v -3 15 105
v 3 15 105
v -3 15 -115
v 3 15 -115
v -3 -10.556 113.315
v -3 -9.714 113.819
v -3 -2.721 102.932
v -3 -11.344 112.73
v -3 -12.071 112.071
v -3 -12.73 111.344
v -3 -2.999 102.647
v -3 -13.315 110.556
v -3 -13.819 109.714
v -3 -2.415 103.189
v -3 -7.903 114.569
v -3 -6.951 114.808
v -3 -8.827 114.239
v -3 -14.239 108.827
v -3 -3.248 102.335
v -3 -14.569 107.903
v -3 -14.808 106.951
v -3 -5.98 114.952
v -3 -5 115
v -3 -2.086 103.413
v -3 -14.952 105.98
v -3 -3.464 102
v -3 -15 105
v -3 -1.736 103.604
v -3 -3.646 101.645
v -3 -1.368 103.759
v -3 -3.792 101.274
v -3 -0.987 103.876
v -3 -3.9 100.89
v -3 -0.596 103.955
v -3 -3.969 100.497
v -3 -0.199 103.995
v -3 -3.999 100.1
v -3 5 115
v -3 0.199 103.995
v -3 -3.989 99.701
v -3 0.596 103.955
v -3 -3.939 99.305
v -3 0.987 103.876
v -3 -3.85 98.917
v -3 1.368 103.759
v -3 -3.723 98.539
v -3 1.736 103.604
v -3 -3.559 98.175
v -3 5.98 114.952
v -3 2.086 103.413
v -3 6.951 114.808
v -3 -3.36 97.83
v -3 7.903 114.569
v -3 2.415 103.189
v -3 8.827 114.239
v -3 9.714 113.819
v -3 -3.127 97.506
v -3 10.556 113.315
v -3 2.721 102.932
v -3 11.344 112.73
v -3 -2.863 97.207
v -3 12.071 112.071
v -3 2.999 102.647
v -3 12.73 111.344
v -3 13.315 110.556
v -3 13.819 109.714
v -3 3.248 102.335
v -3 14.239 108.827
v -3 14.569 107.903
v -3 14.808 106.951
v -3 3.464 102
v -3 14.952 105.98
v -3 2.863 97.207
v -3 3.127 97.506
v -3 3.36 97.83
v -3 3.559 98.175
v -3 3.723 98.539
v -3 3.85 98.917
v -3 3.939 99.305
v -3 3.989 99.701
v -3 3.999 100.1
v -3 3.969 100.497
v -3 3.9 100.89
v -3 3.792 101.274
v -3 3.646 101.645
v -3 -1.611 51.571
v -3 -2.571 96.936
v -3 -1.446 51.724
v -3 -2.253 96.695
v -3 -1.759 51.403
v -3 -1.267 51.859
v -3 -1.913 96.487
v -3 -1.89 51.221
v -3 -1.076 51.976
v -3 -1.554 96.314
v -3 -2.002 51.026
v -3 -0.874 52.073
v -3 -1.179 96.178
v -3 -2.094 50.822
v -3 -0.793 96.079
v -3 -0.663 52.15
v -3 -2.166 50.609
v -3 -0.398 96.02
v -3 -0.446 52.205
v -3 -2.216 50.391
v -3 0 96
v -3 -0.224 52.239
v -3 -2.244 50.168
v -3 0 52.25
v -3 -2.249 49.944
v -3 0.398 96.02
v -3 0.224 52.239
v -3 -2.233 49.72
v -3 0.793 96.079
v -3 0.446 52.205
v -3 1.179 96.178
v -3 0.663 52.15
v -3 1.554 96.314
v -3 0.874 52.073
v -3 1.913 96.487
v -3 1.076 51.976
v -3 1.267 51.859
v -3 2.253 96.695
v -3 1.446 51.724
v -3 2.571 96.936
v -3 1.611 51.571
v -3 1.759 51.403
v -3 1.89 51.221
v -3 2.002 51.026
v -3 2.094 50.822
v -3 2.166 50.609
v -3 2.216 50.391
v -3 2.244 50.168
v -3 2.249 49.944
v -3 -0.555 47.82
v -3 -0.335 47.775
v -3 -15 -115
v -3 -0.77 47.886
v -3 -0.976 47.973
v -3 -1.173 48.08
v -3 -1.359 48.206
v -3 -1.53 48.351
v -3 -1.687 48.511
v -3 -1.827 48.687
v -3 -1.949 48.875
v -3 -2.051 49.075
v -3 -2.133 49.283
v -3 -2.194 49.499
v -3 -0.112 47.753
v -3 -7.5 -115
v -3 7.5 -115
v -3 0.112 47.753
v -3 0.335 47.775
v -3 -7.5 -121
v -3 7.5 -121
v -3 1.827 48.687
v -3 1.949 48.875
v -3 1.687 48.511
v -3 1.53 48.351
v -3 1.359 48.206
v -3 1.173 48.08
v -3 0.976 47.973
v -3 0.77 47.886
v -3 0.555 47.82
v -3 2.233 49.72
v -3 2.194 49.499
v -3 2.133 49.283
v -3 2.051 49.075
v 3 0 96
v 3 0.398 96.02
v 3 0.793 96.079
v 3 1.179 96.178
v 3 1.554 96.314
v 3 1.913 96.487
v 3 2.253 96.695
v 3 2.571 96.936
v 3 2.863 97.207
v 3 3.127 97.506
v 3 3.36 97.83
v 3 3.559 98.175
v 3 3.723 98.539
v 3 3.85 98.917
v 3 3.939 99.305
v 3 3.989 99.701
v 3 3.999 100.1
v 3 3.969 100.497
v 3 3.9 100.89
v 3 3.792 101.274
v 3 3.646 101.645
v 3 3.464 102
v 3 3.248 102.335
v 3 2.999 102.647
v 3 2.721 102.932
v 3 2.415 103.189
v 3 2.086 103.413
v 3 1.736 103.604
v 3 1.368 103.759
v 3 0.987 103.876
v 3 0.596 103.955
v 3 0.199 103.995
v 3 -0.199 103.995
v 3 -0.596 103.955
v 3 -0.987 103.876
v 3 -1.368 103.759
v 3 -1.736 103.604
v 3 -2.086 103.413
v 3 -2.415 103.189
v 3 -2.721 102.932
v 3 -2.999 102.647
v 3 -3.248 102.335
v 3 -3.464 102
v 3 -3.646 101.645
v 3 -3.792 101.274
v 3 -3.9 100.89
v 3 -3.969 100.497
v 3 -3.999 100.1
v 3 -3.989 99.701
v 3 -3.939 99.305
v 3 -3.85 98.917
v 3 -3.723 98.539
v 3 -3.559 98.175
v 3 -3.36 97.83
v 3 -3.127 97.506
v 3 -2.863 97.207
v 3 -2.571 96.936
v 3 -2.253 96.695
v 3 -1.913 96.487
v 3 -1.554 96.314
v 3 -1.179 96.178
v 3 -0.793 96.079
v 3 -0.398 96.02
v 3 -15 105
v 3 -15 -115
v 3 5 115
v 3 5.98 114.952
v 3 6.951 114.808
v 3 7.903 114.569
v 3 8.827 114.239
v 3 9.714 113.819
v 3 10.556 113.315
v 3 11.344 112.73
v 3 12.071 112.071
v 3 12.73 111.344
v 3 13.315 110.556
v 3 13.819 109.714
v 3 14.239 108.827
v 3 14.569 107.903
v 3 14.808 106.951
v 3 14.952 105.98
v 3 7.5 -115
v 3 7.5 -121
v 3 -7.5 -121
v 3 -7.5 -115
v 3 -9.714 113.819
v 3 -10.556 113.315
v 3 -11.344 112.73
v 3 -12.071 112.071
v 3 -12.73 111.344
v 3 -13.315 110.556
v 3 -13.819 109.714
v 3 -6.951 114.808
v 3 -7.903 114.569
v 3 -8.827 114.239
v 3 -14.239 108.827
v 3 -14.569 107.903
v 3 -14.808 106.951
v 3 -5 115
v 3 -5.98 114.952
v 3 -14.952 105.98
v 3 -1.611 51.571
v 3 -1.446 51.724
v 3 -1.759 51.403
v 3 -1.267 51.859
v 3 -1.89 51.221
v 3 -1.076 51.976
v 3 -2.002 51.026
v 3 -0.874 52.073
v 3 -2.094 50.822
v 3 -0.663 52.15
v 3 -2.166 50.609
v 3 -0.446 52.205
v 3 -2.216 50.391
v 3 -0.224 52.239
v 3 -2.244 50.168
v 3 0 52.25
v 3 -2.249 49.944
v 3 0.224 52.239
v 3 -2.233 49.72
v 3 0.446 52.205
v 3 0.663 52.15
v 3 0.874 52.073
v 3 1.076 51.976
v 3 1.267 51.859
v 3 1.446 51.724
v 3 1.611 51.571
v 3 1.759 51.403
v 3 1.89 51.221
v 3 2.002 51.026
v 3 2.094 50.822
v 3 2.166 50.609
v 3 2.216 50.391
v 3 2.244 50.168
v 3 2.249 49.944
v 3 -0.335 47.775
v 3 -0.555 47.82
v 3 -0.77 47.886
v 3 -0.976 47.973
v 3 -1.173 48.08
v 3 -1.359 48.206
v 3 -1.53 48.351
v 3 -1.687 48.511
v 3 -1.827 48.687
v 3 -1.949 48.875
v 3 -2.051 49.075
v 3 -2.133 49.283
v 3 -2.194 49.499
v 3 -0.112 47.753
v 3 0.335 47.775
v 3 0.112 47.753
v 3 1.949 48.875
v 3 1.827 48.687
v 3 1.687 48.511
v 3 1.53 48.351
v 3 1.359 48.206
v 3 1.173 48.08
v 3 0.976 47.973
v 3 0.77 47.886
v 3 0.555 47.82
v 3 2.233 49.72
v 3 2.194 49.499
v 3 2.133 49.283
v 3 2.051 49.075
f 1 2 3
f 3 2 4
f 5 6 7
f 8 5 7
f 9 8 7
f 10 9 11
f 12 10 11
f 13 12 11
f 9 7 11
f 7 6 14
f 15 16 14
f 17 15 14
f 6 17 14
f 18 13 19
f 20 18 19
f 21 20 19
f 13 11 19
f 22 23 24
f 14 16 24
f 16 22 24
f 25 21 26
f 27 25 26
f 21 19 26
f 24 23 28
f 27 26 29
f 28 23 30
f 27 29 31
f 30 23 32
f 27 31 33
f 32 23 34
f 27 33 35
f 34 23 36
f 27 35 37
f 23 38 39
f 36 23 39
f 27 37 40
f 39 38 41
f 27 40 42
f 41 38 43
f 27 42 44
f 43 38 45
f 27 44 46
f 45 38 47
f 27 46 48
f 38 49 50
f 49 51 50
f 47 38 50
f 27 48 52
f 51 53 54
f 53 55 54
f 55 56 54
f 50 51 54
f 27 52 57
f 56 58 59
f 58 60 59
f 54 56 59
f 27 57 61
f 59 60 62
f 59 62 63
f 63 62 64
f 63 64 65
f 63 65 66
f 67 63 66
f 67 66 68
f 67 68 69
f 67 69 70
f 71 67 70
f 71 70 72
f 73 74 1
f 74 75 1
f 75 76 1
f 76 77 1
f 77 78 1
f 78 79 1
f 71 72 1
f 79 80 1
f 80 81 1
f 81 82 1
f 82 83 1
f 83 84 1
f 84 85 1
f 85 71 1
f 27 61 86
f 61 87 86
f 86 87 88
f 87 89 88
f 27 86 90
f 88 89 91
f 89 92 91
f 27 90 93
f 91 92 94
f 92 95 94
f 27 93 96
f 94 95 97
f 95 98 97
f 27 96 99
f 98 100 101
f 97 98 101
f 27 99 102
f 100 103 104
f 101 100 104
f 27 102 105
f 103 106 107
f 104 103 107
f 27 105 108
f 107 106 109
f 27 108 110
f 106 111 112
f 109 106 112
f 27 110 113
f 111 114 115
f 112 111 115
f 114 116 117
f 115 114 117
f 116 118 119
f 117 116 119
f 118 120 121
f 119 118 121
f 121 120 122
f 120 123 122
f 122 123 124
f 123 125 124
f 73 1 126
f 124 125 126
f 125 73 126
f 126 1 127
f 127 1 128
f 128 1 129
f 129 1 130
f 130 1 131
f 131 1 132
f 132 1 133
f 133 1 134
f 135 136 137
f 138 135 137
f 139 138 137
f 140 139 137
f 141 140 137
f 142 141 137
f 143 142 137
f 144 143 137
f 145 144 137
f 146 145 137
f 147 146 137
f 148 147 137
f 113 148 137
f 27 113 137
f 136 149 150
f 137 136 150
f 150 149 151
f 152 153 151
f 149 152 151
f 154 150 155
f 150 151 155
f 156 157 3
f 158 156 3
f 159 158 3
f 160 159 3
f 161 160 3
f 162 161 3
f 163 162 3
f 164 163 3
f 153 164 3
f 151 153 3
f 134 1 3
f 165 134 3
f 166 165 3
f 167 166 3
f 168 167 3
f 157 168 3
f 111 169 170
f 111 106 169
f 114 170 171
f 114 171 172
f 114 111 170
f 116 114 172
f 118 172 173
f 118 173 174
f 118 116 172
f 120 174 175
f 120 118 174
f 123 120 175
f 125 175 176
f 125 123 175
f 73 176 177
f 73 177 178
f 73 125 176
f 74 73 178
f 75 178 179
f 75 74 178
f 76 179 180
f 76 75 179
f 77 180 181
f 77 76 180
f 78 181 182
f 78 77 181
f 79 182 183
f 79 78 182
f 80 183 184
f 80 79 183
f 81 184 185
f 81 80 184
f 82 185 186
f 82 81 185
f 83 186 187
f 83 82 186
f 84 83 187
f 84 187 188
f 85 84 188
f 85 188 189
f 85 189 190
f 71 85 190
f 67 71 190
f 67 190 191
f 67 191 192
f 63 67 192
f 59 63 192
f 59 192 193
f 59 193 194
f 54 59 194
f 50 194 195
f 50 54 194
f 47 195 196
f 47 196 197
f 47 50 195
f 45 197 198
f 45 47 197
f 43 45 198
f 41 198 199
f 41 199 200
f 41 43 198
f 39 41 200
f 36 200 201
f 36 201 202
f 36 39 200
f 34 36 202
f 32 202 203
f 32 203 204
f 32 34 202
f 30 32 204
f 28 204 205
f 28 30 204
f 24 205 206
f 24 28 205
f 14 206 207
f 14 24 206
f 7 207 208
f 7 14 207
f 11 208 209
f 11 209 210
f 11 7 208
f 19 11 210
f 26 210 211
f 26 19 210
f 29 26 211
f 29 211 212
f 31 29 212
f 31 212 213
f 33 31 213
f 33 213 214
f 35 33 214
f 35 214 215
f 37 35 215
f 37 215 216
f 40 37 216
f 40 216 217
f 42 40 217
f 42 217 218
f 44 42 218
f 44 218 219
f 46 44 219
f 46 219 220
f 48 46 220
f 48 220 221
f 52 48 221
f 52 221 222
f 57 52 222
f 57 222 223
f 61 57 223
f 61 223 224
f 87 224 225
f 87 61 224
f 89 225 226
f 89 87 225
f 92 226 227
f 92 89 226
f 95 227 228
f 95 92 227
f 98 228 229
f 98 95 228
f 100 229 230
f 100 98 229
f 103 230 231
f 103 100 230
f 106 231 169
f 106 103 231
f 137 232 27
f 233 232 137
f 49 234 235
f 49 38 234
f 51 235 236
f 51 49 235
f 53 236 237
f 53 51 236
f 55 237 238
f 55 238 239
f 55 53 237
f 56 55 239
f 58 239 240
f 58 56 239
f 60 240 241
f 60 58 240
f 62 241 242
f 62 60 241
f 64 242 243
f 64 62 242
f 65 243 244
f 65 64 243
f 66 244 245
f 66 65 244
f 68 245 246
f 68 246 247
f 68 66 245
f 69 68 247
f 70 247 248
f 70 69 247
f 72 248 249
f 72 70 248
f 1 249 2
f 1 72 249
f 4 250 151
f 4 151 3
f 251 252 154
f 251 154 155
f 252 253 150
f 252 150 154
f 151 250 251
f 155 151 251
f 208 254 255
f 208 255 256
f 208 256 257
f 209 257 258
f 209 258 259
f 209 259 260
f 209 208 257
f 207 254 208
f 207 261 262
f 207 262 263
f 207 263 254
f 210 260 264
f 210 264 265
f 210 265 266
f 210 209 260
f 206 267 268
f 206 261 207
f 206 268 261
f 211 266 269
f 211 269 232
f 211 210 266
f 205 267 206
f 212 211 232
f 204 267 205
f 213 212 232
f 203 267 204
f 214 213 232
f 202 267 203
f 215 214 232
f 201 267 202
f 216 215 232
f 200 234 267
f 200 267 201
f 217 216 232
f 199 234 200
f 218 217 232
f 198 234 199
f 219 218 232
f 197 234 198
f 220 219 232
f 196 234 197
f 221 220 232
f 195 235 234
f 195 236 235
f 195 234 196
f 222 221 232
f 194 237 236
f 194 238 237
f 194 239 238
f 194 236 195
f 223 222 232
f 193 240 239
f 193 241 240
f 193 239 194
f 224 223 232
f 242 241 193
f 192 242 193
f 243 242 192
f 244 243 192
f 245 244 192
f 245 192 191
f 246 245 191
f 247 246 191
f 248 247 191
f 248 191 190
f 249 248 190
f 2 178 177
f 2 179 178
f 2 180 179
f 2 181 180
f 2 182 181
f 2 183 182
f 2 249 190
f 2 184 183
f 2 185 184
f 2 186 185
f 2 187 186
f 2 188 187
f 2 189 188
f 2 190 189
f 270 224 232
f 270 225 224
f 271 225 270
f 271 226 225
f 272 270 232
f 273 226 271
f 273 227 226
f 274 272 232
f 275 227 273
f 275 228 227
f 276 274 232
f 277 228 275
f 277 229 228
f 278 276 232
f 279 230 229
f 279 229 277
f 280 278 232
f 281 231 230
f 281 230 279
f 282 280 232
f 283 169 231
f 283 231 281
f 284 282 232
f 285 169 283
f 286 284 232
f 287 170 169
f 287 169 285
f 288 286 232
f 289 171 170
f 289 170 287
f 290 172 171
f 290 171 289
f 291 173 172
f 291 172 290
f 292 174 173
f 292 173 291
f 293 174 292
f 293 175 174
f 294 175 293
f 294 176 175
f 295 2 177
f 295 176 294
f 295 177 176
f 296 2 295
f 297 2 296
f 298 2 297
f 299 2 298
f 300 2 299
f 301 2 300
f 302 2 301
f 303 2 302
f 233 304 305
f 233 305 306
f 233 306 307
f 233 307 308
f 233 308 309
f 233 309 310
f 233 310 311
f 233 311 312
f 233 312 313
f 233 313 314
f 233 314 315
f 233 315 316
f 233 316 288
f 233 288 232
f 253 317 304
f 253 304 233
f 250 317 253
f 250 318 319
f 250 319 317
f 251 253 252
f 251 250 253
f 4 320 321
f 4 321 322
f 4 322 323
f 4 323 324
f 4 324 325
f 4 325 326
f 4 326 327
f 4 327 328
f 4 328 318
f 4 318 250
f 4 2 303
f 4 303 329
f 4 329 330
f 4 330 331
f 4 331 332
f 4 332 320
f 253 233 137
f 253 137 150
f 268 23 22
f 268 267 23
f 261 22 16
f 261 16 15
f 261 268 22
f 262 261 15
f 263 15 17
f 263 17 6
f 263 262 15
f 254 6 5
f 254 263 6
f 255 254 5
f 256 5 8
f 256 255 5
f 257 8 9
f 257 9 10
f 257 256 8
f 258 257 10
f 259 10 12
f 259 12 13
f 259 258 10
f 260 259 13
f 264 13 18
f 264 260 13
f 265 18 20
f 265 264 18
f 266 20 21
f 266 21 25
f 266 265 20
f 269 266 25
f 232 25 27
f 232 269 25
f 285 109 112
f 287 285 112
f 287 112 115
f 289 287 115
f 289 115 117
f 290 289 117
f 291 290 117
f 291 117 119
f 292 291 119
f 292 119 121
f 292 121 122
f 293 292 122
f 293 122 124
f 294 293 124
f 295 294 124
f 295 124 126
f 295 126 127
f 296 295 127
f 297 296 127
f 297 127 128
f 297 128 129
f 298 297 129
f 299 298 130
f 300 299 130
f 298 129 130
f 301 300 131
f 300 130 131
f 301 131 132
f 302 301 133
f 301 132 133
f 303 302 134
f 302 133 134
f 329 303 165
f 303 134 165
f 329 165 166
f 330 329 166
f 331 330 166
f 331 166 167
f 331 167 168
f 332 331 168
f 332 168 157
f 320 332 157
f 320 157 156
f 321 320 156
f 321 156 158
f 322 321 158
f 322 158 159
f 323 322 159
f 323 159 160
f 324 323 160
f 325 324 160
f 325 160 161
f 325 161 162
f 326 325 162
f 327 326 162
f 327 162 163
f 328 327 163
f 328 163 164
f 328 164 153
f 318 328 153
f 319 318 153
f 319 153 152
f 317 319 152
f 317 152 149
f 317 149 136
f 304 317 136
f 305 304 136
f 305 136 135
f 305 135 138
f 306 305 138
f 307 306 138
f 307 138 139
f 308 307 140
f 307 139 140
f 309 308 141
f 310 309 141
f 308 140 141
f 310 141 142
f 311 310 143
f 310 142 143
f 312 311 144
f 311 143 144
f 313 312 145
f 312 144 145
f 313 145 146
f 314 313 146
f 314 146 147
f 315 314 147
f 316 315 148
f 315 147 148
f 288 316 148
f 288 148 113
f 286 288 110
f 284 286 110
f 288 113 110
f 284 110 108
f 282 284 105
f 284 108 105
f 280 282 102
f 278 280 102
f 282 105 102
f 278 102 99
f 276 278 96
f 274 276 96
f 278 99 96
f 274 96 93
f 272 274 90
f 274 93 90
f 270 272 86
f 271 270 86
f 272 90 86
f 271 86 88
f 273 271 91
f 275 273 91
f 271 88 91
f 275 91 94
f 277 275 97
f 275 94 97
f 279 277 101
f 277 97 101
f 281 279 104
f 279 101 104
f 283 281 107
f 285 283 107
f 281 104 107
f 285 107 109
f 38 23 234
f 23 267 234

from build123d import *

# Parameters (mm, degrees)
CROQUIS2_W                   = 230
CROQUIS2_H                   = 30
CROQUIS2_R                   = 4
SALIENTE_EXTRUIR1_DEPTH      = 3
TALADRO_DE_MARGEN_PARA_M41_D = 4.5
REDONDEO1_R                  = 10
CROQUIS5_W                   = 6
CROQUIS5_H                   = 15
SALIENTE_EXTRUIR2_DEPTH      = 6


with BuildPart() as part:
    # Croquis2 → Saliente-Extruir1 (new, symmetric)
    with BuildSketch(Plane(origin=(0, 0, 0), x_dir=(0, 0, -1), z_dir=(1, 0, 0))):
        Rectangle(CROQUIS2_W, CROQUIS2_H)
        with Locations((-100, 0)):
            Circle(CROQUIS2_R, mode=Mode.SUBTRACT)
    extrude(amount=SALIENTE_EXTRUIR1_DEPTH, both=True)

    # Taladro de margen para M41 (through all)
    with Locations(Plane(origin=(3, 0, 0), x_dir=(0, 0, -1), z_dir=(1, 0, 0))):
        with Locations((-50, 0)):
            Hole(TALADRO_DE_MARGEN_PARA_M41_D / 2)

    # Redondeo1
    redondeo1_edges = [part.edges().sort_by_distance(p)[0] for p in [
        (0, 15, 115),
        (0, -15, 115),
    ]]
    fillet(redondeo1_edges, radius=REDONDEO1_R)

    # Croquis5 → Saliente-Extruir2 (add, through all)
    with BuildSketch(Plane(origin=(3, 0, 0), x_dir=(0, 0, -1), z_dir=(1, 0, 0))):
        with Locations((118, 0)):
            Rectangle(CROQUIS5_W, CROQUIS5_H)
    extrude(amount=-SALIENTE_EXTRUIR2_DEPTH)


solid = part.part
